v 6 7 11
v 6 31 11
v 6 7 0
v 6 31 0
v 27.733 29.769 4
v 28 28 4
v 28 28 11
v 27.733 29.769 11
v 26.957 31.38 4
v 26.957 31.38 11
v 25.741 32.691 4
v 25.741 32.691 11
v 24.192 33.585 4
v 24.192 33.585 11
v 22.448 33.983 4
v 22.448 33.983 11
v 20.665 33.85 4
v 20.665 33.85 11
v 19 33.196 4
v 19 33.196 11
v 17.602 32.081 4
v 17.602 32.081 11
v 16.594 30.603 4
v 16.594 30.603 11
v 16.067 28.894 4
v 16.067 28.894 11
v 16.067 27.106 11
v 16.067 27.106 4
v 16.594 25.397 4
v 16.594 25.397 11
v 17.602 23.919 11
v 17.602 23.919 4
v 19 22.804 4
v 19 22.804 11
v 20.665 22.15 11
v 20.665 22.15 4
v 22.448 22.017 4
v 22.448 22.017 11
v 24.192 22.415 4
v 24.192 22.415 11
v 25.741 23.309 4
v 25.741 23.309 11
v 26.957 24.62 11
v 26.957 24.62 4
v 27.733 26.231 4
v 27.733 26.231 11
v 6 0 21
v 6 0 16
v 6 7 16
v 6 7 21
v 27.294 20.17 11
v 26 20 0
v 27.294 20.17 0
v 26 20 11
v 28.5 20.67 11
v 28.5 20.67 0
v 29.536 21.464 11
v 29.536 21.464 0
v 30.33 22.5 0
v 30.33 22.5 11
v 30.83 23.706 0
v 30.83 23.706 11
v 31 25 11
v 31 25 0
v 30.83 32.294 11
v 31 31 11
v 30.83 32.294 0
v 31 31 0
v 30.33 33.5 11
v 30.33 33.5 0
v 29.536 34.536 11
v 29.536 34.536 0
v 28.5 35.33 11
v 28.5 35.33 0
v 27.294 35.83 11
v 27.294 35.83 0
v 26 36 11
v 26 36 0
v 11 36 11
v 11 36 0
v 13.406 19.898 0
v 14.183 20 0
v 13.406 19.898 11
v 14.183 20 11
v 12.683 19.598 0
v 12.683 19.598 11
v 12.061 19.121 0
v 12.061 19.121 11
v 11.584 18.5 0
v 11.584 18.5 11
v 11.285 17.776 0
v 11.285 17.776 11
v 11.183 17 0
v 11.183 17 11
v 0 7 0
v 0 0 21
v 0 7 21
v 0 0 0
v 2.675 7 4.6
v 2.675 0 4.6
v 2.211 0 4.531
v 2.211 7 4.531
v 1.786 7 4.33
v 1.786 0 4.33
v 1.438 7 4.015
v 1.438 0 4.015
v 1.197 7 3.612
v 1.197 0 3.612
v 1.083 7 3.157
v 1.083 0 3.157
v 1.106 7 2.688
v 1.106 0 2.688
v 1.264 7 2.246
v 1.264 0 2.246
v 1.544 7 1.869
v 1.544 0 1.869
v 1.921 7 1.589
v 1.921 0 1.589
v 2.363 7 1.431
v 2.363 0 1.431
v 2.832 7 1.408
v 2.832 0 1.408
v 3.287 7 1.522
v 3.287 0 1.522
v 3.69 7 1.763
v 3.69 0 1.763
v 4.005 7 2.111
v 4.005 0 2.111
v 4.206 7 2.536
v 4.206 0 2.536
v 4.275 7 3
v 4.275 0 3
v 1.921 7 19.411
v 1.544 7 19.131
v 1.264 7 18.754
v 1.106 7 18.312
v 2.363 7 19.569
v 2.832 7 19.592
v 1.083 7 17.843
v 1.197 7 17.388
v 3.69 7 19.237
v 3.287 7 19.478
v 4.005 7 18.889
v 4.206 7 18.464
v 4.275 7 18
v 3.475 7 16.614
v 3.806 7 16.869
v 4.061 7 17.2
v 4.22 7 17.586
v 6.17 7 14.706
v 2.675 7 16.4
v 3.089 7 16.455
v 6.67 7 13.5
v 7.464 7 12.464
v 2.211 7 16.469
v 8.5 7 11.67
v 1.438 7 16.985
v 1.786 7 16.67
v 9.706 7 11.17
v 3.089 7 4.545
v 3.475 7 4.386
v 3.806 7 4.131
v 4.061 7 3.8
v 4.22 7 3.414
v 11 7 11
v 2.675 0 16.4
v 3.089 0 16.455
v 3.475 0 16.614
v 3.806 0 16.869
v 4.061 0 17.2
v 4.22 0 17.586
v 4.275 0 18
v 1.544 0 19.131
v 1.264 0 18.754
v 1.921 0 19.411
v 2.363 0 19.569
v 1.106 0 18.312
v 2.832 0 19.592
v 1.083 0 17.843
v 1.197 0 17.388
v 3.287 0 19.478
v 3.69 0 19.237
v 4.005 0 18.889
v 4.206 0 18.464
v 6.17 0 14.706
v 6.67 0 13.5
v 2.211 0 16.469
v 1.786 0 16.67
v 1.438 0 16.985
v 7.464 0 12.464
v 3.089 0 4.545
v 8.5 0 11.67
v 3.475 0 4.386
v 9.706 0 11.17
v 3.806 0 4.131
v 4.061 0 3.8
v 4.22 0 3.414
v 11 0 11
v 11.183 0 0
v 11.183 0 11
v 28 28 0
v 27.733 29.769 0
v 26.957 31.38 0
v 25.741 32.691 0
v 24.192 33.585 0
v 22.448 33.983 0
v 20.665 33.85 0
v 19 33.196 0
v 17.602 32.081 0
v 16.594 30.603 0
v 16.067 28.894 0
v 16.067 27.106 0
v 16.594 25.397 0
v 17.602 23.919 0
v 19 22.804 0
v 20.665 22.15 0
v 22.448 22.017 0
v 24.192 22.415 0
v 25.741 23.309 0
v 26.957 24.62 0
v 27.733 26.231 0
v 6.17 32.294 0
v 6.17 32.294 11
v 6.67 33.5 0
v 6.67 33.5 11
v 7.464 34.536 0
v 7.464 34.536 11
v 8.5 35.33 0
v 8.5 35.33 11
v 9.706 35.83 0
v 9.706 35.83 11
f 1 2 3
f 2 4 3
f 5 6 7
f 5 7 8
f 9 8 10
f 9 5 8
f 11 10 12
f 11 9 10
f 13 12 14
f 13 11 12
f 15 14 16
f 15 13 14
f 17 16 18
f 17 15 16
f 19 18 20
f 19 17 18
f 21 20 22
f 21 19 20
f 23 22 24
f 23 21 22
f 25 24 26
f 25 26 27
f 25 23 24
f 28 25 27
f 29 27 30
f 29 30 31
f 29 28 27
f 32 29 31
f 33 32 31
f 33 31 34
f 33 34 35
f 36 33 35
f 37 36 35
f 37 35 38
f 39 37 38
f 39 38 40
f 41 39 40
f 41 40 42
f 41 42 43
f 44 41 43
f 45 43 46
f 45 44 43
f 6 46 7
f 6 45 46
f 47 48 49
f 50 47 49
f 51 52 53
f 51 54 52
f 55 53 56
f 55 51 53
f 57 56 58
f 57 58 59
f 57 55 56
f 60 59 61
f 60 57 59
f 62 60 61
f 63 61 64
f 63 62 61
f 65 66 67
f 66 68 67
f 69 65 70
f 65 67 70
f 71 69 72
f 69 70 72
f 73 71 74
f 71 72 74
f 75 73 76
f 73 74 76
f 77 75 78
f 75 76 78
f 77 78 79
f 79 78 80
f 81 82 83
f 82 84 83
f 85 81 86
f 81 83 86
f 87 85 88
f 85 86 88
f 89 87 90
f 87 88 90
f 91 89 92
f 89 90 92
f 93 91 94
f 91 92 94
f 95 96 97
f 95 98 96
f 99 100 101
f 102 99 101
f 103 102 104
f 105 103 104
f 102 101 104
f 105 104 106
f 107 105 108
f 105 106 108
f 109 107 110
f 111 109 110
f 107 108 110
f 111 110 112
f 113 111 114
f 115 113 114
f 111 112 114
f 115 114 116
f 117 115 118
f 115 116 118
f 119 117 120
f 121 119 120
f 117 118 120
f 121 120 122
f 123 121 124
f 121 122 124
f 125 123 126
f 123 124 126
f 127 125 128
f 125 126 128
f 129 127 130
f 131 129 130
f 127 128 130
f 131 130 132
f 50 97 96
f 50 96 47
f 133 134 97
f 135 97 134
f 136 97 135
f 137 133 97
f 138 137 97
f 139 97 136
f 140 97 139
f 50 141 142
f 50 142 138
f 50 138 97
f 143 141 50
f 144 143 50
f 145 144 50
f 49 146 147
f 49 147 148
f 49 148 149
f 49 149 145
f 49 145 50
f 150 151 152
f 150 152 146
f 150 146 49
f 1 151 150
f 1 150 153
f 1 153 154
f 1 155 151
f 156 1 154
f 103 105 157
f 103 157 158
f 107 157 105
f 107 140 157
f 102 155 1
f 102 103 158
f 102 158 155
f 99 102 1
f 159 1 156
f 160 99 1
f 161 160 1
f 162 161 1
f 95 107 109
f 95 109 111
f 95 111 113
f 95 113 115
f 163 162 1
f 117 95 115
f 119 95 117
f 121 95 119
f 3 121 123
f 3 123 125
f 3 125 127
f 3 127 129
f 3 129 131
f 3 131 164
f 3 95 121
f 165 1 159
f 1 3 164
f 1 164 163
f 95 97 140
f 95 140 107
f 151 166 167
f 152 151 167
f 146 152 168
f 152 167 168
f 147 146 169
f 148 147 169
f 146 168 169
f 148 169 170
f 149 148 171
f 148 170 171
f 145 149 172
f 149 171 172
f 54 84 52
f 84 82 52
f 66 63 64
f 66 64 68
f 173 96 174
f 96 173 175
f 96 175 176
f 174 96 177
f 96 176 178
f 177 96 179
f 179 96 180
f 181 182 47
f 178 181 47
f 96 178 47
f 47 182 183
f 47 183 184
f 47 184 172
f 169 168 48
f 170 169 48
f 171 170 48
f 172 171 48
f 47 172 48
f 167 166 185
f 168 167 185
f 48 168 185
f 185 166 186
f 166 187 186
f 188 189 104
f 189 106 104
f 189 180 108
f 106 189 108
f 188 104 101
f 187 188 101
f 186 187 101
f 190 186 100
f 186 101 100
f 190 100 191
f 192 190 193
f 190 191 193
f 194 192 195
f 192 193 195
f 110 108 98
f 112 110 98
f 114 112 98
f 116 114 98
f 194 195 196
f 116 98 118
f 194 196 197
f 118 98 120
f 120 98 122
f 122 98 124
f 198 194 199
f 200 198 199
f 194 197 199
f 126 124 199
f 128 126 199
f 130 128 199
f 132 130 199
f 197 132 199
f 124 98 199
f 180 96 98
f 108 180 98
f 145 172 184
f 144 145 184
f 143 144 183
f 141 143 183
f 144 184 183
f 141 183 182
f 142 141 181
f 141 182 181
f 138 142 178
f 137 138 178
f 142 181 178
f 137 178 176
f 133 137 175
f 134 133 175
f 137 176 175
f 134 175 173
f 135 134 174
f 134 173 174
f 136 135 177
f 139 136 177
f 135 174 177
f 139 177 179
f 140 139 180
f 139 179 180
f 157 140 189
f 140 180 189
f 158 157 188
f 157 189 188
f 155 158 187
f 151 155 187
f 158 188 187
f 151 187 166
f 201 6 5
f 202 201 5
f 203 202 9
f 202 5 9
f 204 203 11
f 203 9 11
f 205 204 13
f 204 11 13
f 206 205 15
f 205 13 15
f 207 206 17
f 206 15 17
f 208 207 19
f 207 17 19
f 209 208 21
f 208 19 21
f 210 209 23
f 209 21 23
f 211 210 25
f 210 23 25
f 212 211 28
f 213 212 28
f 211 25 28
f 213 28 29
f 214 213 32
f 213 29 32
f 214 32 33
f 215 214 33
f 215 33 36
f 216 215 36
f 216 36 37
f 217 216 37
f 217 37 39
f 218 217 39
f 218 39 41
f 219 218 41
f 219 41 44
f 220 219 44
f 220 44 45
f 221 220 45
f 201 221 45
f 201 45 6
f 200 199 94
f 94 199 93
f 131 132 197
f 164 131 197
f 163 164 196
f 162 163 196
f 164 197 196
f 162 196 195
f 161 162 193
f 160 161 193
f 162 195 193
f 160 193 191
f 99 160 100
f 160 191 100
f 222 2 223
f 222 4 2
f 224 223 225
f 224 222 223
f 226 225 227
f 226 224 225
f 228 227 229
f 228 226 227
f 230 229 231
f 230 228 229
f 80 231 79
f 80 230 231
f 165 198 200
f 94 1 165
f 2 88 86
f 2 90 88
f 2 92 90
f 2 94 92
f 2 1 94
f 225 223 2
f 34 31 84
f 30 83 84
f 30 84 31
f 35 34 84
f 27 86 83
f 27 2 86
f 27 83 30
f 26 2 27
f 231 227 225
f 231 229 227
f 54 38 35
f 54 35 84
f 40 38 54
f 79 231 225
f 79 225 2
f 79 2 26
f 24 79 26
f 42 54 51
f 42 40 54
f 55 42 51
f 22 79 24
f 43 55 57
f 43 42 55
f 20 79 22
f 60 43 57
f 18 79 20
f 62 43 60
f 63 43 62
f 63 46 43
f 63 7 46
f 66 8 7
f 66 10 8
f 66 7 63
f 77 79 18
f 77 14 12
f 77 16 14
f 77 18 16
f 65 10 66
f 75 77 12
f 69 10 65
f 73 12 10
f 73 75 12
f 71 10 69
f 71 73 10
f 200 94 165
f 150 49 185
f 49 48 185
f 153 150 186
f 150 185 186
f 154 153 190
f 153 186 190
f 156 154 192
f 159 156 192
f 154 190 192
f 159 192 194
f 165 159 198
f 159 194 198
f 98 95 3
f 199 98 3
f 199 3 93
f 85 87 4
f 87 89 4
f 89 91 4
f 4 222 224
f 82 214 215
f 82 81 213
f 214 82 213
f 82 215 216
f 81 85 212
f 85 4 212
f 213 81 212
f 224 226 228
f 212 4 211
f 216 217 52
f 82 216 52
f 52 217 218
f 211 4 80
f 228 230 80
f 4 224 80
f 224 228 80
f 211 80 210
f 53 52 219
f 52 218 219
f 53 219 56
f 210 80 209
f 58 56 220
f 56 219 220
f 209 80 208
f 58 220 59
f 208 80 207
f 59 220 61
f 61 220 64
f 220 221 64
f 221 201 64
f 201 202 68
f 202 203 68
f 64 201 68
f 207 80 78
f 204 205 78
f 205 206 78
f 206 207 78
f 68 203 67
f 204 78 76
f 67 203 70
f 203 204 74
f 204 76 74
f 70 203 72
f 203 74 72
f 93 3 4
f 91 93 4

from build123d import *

# Parameters (mm, degrees)
F0_W     = 31
F0_H     = 36
F1_DEPTH = 4
F2_R     = 6
F2_W     = 6
F2_H     = 29
F2_W_2   = 19.817460835
F2_H_2   = 20
F3_DEPTH = 25
F4_W     = 6
F4_H     = 7
F4_R     = 6
F5_DEPTH = 7
F6_DEPTH = 17
F8_DEPTH = 25
F9_F1_R  = 5
F9_F2_R  = 5
F10_R    = 3


# Not quite as in the source:
# - two fillets or chamfers of one size are made in one step


with BuildPart() as f1:
    # F0 (on Top) → F1 (new body)
    with BuildSketch(Plane.XY):
        with Locations((15.5, 18)):
            Rectangle(F0_W, F0_H)
    extrude(amount=F1_DEPTH)

    # F2 (on face) → F3 (cut)
    with BuildSketch(Plane.XY.offset(4)):
        with Locations((22, 28)):
            Circle(F2_R)
        with Locations((3, 21.5)):
            Rectangle(F2_W, F2_H)
        with Locations((21.0912695825, 10)):
            Rectangle(F2_W_2, F2_H_2)
    extrude(amount=-F3_DEPTH, mode=Mode.SUBTRACT)

    # F4 (on face) → F5 (join)
    with BuildSketch(Plane.XY.offset(4)):
        with Locations((3, 3.5)):
            Rectangle(F4_W, F4_H)
        Polygon((6, 36), (6, 7), (6, 0), (11.182539165, 0), (11.182539165, 20), (31, 20), (31, 36), align=None)
        with Locations((22, 28)):
            Circle(F4_R, mode=Mode.SUBTRACT)
    extrude(amount=F5_DEPTH)

    # F4 (on face) → F6 (join)
    with BuildSketch(Plane.XY.offset(4)):
        with Locations((3, 3.5)):
            Rectangle(F4_W, F4_H)
    extrude(amount=F6_DEPTH)

    # F7 (on face) → F8 (cut)
    with BuildSketch(Plane.XZ):
        with BuildLine():
            ThreePointArc((4.275, 3), (3.8063708499, 4.1313708499), (2.675, 4.6))
            ThreePointArc((2.675, 4.6), (1.5436291501, 1.8686291501), (4.275, 3))
        make_face()
        with BuildLine():
            ThreePointArc((4.275, 18), (1.5436291501, 19.1313708499), (2.675, 16.4))
            ThreePointArc((2.675, 16.4), (3.8063708499, 16.8686291501), (4.275, 18))
        make_face()
    extrude(amount=-F8_DEPTH, mode=Mode.SUBTRACT)

    # F9: fillet of radius 5 on 4 edges, made by hand

    # F9_f1
    f9_f1_edges = [f1.edges().sort_by_distance(p)[0] for p in [
        (6, 3.5, 11),
    ]]
    fillet(f9_f1_edges, radius=F9_F1_R)

    # F9_f2
    f9_f2_edges = [f1.edges().sort_by_distance(p)[0] for p in [
        (31, 36, 5.5),
        (6, 36, 5.5),
        (31, 20, 5.5),
    ]]
    fillet(f9_f2_edges, radius=F9_F2_R)

    # F10
    f10_edges = [f1.edges().sort_by_distance(p)[0] for p in [
        (11.182539, 20, 5.5),
    ]]
    fillet(f10_edges, radius=F10_R)


solid = f1.part
